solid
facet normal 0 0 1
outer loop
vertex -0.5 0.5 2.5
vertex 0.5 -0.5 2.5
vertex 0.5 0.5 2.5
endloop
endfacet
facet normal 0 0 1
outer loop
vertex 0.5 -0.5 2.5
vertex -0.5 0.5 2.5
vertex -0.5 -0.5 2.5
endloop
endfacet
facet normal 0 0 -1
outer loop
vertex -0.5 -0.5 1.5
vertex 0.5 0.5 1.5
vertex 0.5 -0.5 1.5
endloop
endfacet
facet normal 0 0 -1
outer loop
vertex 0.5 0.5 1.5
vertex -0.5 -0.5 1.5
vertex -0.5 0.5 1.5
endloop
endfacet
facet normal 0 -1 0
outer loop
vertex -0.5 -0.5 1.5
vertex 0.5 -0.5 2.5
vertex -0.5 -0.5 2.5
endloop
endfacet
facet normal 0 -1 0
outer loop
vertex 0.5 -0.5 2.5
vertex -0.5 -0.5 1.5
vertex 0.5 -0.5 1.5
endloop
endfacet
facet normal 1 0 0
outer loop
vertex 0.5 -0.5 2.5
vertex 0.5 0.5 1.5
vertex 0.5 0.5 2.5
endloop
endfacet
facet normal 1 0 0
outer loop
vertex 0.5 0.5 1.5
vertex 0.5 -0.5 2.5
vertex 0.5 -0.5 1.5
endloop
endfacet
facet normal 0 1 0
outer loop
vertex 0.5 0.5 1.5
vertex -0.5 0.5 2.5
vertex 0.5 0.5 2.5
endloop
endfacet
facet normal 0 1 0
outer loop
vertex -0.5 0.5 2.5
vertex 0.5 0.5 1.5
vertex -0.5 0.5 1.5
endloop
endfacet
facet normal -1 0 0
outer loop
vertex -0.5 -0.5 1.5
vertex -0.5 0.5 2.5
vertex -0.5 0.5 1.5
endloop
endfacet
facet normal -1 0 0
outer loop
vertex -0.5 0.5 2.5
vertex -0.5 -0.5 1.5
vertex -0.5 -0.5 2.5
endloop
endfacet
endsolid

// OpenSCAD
// See [is_nan()](https://forum.openscad.org/is-nan-td28336.html) 
// for a discussion about why the following user defined function works.

nan2 = 0/0; 
inf = 1/0; 
ninf = -1/0; 
echo(inf, ninf, nan2); 
function is_nan(x) = x!=x;
echo(is_nan(nan2));
echo(is_nan(0/0));
echo(is_nan(3));

translate([0, 0, 2]) rotate(45, [0, 0, 0]) cube(1, center=true);
